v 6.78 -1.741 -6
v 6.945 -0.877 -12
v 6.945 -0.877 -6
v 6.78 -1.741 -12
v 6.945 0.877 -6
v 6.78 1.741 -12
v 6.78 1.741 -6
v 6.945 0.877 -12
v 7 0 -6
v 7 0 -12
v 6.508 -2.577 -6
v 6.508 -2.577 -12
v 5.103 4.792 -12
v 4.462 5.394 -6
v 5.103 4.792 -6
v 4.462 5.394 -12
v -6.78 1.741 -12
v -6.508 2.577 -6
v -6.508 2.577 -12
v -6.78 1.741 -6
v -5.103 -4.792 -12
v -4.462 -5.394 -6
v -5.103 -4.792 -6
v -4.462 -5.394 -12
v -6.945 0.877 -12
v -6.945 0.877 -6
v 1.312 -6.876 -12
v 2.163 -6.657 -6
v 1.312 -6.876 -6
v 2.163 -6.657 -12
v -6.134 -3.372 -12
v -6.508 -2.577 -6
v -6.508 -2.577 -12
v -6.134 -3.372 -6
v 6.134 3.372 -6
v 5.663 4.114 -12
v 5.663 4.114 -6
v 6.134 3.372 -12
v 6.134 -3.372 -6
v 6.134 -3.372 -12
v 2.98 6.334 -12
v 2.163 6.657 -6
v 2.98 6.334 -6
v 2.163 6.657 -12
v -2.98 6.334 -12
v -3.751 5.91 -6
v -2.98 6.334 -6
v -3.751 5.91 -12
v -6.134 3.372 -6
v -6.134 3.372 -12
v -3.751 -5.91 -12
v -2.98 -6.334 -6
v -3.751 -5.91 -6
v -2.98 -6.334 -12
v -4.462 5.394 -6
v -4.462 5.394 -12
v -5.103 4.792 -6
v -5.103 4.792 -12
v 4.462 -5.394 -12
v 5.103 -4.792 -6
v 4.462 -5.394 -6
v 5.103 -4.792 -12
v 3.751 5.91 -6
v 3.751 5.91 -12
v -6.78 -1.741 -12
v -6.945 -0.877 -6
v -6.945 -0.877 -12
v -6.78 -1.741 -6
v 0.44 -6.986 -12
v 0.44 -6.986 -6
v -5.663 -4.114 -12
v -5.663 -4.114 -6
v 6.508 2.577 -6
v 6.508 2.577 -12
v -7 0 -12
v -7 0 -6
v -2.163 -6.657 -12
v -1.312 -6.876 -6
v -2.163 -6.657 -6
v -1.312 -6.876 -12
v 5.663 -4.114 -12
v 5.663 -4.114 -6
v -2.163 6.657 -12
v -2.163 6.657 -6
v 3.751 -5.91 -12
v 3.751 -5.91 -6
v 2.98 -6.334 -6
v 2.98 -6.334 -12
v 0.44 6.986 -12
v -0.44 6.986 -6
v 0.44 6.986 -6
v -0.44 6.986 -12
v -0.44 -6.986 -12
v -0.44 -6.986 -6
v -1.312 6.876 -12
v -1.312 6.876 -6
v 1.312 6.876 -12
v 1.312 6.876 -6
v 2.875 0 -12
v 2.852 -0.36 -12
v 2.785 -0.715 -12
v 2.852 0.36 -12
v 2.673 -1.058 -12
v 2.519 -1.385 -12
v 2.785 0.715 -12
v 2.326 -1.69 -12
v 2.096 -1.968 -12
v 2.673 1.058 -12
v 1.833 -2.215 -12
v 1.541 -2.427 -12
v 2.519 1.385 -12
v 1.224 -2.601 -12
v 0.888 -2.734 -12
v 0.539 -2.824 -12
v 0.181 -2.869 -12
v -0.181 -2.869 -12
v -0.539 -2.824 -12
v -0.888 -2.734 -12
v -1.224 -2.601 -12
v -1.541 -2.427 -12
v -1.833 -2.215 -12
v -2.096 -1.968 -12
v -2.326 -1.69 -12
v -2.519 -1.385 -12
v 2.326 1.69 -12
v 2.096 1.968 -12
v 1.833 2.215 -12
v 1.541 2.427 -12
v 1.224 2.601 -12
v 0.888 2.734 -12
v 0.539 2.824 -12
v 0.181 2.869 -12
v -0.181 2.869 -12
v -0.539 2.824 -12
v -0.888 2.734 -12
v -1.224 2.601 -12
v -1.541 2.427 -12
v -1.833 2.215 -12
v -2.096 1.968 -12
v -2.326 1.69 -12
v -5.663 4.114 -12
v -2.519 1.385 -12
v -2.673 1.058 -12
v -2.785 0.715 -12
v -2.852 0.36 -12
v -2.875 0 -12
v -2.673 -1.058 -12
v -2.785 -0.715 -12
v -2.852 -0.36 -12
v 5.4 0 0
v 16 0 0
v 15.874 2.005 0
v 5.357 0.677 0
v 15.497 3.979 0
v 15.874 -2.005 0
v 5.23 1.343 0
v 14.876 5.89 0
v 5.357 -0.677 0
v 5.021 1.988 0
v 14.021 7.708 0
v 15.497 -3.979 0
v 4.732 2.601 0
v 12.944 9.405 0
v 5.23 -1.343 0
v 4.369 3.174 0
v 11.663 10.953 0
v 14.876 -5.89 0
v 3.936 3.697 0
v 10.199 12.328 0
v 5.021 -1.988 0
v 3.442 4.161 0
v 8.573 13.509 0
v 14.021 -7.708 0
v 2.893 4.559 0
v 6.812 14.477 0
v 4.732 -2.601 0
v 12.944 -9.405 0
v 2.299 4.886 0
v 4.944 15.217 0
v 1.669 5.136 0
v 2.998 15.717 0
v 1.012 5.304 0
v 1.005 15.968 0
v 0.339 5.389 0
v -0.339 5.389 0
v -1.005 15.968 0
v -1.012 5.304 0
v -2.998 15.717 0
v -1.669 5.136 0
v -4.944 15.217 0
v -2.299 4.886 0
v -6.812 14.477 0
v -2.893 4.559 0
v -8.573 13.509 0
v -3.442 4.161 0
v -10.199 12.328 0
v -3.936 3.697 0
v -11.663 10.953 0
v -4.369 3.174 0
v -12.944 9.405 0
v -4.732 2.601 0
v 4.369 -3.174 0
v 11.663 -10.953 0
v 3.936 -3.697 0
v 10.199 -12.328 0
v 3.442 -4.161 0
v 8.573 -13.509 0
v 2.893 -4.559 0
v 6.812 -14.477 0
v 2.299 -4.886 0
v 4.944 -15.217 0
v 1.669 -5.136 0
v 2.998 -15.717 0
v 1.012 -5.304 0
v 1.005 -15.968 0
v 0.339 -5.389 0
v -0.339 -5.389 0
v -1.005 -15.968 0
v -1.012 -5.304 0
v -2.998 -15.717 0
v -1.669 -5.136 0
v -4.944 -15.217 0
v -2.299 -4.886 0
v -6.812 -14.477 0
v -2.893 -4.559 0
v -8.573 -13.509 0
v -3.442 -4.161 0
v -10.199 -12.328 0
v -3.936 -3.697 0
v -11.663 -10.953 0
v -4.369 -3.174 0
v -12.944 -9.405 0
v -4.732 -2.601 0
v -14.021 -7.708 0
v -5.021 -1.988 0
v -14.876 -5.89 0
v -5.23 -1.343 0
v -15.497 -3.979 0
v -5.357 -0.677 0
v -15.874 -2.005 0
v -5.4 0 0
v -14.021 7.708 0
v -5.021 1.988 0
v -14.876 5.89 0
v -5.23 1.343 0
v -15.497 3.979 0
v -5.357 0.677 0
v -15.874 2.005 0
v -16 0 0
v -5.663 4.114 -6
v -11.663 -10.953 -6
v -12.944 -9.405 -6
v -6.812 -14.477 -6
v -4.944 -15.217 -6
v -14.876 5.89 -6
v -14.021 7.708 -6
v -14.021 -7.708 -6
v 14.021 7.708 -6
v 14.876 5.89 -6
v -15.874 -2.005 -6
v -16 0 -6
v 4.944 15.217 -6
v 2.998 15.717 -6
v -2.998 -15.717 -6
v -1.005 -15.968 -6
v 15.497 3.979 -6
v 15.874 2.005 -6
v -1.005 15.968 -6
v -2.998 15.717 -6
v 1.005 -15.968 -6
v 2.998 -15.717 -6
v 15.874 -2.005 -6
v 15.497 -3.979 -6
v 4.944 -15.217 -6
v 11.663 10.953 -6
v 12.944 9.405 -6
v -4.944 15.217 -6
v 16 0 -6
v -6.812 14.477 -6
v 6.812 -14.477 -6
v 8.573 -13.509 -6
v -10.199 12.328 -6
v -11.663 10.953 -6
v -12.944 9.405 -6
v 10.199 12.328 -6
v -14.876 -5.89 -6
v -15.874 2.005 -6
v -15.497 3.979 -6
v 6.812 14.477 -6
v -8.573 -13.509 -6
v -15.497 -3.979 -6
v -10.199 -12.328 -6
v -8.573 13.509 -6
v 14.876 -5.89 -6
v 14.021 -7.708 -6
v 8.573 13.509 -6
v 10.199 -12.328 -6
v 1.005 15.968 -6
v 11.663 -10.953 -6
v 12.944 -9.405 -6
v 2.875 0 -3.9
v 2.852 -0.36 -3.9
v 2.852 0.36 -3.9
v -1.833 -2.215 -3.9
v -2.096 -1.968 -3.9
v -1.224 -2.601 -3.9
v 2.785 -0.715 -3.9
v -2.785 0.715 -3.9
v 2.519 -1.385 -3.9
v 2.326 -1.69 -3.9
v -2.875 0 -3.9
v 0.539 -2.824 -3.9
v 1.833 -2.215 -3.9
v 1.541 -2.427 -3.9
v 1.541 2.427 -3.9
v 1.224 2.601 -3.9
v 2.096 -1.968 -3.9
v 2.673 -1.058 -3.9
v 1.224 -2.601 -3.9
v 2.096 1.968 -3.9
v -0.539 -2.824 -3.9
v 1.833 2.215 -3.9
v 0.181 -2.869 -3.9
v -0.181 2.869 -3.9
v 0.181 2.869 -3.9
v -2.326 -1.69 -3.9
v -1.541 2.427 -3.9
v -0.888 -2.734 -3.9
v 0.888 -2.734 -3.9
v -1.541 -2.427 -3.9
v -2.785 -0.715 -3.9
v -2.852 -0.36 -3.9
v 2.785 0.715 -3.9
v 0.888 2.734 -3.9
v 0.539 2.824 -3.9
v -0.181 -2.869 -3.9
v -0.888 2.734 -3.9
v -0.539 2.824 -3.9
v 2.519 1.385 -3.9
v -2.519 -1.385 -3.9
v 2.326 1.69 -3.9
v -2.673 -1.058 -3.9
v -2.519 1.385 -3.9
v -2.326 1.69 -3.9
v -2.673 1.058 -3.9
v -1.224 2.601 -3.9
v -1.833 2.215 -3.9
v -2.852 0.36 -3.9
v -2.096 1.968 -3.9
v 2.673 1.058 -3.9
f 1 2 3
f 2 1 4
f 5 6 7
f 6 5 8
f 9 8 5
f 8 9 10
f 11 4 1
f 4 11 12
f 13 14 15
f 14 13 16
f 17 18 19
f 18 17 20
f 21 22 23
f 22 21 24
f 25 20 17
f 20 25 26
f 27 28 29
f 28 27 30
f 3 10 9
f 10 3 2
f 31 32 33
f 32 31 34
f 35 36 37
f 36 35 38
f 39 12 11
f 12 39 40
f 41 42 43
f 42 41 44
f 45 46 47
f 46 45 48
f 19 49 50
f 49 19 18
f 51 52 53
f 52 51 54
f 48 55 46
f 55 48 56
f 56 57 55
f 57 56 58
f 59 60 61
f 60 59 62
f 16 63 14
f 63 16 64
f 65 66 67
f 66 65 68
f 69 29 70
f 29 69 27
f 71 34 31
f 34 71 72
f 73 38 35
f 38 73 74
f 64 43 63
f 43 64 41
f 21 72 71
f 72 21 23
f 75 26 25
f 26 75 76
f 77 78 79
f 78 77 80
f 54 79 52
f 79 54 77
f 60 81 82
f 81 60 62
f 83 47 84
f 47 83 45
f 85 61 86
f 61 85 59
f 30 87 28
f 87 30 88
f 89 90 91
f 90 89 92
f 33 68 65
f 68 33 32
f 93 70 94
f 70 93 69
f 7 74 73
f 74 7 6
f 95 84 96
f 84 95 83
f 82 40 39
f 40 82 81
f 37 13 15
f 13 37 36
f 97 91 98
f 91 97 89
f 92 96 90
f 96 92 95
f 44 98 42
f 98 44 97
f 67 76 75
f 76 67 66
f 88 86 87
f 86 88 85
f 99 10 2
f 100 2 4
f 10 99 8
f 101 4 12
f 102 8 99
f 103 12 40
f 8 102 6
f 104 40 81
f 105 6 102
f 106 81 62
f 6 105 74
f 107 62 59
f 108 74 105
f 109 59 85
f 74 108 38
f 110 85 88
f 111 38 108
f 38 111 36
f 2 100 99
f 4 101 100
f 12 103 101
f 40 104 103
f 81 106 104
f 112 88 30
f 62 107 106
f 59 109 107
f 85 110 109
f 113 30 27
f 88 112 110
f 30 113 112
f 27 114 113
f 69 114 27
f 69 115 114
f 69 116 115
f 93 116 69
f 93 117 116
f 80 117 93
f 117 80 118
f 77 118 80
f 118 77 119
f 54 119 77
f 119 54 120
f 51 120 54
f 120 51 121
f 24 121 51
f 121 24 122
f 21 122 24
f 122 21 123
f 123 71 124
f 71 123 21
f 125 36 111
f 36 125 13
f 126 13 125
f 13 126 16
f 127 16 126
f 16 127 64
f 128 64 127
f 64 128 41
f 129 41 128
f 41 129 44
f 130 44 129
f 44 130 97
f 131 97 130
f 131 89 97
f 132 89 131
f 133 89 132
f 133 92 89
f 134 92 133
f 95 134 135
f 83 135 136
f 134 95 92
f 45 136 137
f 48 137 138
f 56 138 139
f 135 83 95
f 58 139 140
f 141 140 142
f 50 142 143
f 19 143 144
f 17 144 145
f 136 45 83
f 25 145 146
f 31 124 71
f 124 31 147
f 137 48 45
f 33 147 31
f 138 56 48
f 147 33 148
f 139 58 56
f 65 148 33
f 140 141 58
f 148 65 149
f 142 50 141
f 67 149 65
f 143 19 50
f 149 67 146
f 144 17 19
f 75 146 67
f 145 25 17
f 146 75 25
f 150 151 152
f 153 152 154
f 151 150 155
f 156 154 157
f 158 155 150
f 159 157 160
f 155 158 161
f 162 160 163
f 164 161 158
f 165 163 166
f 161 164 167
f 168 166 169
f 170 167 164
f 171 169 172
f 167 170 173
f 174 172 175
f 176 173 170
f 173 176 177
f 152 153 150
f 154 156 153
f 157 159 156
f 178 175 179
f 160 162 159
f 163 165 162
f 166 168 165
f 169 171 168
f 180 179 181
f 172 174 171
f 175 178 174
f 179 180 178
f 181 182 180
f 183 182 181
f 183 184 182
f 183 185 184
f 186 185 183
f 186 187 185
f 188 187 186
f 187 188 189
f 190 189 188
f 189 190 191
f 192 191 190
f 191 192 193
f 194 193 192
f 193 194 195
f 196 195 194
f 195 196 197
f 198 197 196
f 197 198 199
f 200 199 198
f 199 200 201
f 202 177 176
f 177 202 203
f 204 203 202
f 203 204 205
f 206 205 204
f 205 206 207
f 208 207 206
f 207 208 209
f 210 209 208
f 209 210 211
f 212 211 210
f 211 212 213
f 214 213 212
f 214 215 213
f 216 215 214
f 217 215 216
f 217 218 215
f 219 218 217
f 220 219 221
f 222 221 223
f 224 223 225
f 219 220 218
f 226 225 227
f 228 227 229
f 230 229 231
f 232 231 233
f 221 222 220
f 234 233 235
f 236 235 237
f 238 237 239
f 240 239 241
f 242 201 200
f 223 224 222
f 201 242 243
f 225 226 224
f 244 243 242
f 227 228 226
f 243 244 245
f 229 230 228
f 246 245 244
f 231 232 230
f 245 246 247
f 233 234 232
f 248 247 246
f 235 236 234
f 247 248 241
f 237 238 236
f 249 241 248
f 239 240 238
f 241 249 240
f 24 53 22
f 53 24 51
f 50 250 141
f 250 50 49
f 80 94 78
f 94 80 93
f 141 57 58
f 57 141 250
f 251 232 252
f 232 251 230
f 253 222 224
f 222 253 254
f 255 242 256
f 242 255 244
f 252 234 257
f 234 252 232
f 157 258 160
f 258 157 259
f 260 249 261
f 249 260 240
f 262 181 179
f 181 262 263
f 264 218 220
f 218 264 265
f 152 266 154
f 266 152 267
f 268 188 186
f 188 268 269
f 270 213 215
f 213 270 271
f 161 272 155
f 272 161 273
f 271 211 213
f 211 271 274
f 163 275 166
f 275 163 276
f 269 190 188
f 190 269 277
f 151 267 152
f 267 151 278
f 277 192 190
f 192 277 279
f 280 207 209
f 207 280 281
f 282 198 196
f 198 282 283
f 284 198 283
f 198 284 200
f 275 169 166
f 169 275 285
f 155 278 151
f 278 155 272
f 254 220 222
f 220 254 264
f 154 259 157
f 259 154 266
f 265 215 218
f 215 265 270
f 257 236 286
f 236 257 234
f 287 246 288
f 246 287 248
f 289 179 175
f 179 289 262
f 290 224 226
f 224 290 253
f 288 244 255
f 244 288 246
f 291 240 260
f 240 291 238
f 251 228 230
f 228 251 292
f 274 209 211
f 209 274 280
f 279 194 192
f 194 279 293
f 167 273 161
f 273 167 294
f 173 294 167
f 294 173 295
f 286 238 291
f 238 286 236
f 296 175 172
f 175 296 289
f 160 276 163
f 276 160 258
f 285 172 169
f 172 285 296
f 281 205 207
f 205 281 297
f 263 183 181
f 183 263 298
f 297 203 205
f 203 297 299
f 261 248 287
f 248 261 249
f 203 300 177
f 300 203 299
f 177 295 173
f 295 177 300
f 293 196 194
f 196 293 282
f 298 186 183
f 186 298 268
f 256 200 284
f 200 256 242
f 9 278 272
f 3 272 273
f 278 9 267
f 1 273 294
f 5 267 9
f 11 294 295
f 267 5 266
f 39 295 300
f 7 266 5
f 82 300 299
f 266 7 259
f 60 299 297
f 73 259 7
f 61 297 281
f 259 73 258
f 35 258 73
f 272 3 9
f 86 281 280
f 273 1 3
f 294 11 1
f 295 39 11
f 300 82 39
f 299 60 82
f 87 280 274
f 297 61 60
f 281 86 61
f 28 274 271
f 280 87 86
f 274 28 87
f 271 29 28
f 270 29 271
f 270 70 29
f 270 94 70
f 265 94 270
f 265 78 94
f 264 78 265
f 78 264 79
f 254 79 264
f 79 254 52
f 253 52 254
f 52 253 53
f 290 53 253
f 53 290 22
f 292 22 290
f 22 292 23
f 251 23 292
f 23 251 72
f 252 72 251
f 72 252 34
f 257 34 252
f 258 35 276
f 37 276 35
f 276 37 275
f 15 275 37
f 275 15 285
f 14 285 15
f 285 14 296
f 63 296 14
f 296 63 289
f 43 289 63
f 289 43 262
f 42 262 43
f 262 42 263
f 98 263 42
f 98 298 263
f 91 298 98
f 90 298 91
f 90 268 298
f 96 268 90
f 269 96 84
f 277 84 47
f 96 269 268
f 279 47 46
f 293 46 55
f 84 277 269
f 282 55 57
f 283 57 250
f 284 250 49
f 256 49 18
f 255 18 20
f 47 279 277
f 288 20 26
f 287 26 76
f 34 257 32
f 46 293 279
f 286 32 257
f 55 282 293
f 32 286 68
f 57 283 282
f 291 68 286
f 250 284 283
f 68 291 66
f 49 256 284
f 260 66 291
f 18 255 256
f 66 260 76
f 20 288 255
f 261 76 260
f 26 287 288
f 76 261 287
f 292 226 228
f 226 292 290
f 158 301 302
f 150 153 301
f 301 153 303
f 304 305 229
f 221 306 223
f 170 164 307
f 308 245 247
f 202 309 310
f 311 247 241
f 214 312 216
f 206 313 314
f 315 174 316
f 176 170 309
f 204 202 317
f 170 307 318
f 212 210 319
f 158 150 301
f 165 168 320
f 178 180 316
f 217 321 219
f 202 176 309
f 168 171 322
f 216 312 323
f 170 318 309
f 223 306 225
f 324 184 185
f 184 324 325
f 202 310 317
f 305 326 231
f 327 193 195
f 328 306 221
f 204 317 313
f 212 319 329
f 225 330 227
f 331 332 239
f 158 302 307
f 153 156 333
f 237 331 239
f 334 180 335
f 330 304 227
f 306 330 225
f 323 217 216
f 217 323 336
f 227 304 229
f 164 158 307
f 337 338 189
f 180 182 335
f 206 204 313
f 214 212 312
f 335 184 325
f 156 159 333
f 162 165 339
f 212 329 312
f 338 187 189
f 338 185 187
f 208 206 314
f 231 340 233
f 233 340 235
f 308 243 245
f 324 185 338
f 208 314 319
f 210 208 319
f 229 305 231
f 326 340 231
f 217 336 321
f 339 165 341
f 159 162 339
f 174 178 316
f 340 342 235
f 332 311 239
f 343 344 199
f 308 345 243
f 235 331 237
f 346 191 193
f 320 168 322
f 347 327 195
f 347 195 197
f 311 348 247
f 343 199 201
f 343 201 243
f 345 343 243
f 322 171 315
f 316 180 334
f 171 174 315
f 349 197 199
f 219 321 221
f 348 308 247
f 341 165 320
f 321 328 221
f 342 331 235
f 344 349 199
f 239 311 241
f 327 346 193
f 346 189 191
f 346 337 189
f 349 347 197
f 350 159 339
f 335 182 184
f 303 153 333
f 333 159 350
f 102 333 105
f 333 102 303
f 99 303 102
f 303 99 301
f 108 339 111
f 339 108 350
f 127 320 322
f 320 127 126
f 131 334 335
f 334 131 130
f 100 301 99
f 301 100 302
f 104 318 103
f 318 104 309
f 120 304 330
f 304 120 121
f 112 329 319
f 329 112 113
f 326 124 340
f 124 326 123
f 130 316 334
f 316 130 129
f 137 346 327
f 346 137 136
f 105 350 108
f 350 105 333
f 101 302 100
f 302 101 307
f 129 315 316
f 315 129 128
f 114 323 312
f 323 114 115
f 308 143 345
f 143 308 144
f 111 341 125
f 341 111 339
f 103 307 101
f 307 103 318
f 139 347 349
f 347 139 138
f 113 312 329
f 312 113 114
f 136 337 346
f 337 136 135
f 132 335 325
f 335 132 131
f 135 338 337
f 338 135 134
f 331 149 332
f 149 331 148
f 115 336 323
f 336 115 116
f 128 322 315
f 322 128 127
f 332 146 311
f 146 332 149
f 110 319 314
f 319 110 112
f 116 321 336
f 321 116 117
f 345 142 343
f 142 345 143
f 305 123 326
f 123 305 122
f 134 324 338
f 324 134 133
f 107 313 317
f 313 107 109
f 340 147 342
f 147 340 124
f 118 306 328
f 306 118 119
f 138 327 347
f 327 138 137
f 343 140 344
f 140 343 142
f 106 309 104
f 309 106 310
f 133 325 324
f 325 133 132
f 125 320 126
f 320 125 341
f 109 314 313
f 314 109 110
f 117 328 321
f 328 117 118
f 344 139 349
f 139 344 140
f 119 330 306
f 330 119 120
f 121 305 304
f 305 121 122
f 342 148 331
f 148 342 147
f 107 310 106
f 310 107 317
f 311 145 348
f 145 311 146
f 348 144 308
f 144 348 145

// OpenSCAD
$fn = 50;


difference() {
	union() {
		translate(v = [0, 0, -12.0000000000]) {
			cylinder(h = 12, r = 7.0000000000);
		}
		translate(v = [0, 0, -6.0000000000]) {
			cylinder(h = 6, r = 16.0000000000);
		}
	}
	union() {
		translate(v = [0, 0, 0]) {
			rotate(a = [0, 0, 0]) {
				difference() {
					union() {
						#translate(v = [0, 0, -12.0000000000]) {
							cylinder(h = 12, r = 2.6000000000);
						}
						#translate(v = [0, 0, -3.9000000000]) {
							cylinder(h = 3.9000000000, r1 = 2.8750000000, r2 = 5.4000000000);
						}
						#translate(v = [0, 0, -12.0000000000]) {
							cylinder(h = 12, r = 2.8750000000);
						}
						#translate(v = [0, 0, -12.0000000000]) {
							cylinder(h = 12, r = 2.6000000000);
						}
					}
					union();
				}
			}
		}
	}
}
